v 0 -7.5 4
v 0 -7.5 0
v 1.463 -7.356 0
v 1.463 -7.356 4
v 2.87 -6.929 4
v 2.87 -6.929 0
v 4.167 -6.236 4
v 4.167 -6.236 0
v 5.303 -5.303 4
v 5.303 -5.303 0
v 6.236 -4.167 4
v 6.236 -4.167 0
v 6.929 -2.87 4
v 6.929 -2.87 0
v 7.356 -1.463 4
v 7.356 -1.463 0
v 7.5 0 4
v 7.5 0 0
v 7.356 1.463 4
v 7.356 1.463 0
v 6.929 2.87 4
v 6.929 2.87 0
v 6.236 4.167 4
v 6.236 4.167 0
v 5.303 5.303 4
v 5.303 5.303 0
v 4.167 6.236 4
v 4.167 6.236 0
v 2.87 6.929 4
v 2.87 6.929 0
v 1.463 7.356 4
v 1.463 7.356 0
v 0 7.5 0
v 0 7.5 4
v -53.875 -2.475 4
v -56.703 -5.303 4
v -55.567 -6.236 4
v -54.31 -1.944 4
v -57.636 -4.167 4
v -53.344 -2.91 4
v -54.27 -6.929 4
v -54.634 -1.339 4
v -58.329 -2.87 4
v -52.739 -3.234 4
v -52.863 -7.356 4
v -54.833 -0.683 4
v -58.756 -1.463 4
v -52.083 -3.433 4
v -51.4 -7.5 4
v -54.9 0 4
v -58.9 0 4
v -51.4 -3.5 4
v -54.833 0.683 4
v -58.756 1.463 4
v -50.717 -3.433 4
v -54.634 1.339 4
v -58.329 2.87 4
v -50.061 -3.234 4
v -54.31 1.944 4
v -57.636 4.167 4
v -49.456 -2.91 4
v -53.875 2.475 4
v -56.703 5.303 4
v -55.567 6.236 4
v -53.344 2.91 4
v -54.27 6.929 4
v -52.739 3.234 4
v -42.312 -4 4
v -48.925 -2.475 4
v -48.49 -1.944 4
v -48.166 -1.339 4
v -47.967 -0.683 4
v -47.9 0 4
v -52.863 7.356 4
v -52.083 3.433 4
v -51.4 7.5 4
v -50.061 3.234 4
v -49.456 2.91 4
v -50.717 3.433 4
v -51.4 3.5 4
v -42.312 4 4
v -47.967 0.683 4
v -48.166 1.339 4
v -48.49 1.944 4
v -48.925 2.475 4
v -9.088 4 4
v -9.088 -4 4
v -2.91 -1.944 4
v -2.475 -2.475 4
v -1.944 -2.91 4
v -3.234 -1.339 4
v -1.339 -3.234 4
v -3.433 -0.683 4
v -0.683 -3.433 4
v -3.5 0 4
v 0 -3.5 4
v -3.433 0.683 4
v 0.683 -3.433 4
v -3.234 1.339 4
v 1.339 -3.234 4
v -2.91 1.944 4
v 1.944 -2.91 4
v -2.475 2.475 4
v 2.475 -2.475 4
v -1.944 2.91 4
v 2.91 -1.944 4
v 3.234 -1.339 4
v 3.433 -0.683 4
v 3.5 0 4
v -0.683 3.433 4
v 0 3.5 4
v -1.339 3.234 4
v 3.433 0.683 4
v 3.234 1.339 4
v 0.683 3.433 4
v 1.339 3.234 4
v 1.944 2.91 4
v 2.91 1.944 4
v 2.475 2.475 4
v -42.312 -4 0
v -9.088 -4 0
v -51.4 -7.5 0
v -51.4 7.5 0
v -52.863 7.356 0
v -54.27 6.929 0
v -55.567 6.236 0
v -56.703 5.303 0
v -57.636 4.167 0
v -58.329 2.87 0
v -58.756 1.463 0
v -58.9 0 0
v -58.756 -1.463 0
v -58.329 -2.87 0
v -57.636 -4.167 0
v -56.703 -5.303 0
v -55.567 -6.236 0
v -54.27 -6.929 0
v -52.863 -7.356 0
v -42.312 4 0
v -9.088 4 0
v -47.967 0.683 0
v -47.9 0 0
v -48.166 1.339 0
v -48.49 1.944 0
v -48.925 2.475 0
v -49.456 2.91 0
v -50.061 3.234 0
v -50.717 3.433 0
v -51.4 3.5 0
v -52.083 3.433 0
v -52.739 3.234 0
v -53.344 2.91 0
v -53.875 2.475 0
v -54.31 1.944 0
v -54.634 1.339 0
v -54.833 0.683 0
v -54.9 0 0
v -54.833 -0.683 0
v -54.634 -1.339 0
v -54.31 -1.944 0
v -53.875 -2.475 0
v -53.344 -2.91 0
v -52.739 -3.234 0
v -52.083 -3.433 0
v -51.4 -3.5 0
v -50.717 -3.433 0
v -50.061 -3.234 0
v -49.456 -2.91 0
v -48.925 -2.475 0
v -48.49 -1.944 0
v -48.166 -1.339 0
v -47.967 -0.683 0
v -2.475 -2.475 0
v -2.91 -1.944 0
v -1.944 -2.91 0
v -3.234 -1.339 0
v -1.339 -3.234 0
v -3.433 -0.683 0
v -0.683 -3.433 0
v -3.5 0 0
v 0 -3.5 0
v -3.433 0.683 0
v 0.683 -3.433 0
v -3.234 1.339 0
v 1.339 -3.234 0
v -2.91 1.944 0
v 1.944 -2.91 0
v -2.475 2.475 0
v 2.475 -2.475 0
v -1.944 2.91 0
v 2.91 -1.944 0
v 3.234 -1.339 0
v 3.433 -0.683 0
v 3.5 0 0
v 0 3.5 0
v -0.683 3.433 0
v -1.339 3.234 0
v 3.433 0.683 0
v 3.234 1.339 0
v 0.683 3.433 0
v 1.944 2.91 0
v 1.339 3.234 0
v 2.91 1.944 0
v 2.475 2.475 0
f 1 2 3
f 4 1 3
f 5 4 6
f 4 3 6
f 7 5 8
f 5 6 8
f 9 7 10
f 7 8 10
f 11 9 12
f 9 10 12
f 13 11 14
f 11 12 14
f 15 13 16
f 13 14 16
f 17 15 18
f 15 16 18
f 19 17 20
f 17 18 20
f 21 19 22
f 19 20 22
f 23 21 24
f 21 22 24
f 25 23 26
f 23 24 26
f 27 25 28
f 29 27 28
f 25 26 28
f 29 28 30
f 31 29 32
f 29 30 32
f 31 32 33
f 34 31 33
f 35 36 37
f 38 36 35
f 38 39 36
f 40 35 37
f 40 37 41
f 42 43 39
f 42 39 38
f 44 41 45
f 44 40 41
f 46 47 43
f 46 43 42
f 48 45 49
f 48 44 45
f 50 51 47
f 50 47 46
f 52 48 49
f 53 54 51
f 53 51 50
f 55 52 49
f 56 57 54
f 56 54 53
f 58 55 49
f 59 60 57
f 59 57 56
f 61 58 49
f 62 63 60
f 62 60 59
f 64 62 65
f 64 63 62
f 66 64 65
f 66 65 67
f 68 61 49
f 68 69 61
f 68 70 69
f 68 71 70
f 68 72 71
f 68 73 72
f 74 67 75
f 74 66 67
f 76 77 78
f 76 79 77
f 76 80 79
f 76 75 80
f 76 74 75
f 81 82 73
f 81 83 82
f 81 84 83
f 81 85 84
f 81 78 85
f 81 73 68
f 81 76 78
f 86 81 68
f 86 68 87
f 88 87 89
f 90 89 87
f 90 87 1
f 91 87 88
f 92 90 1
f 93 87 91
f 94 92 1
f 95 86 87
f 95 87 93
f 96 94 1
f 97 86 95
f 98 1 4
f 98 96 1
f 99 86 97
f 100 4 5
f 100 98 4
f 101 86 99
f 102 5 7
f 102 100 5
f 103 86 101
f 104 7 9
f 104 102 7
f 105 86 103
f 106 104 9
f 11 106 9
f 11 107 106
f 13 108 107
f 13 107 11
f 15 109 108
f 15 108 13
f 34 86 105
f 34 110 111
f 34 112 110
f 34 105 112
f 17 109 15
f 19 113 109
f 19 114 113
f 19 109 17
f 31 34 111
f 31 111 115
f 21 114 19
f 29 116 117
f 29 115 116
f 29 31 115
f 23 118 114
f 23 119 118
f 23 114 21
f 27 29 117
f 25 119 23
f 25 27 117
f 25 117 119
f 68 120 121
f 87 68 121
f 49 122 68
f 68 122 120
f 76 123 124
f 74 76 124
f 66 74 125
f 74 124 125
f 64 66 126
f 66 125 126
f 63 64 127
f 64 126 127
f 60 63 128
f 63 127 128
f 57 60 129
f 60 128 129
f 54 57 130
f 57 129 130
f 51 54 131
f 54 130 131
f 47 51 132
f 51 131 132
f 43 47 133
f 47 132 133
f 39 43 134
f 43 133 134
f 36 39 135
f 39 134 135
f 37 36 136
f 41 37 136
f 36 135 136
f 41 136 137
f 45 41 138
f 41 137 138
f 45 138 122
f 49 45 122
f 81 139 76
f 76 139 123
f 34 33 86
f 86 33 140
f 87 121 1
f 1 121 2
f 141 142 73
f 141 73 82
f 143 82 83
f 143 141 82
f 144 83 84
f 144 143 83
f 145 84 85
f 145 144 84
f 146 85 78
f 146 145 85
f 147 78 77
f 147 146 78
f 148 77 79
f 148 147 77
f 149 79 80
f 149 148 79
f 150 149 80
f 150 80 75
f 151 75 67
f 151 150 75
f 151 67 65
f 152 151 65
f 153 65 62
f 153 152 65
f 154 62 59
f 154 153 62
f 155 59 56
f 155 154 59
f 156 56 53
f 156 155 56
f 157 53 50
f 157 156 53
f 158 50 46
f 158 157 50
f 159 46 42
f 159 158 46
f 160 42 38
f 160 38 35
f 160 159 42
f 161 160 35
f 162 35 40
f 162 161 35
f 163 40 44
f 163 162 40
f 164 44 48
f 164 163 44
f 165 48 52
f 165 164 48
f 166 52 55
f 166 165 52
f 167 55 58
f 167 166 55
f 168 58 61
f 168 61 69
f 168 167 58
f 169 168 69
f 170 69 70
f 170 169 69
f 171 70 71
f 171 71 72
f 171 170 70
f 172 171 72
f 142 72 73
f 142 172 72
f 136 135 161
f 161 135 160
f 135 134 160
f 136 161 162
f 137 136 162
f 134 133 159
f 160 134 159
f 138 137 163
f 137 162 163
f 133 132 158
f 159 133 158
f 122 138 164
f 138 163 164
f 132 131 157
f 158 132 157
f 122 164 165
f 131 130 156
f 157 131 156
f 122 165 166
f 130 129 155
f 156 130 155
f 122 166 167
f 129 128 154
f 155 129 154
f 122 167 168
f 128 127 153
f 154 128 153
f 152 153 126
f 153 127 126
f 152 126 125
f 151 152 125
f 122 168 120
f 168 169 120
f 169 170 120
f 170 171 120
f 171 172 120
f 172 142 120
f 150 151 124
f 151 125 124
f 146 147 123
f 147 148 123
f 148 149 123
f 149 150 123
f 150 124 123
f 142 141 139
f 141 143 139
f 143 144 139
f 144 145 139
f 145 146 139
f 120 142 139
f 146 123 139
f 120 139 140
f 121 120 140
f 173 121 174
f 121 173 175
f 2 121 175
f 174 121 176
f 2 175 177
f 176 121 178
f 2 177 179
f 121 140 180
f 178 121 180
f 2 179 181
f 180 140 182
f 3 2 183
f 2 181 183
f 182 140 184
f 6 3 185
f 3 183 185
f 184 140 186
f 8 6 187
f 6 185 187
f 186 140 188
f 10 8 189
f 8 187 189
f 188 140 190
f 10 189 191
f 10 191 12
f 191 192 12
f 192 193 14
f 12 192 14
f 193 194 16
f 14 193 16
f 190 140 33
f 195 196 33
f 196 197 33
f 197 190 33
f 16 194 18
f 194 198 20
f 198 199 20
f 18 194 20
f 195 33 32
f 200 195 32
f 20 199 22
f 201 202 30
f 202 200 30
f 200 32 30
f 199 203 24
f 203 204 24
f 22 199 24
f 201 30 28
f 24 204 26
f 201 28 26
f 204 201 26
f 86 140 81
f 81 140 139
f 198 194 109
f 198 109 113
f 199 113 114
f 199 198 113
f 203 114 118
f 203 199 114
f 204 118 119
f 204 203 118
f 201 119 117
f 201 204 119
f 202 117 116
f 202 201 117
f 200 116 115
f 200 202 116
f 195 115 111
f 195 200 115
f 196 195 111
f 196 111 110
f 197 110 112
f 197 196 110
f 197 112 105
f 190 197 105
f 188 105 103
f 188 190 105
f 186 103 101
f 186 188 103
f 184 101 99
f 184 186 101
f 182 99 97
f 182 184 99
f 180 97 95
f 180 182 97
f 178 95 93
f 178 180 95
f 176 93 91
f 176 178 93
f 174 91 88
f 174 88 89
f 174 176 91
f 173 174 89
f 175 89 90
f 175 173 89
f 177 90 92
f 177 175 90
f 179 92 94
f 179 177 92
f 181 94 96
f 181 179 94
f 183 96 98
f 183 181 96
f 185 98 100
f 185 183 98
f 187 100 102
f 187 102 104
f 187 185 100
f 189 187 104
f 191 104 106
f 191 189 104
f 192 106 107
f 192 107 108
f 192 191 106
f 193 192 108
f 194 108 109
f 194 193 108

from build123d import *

# Parameters (mm, degrees)
SKETCH1_R           = 3.5
BOSS_EXTRUDE2_DEPTH = 4


with BuildPart() as part:
    # Sketch1 → Boss-Extrude2 (new body)
    with BuildSketch(Plane.XY):
        with BuildLine():
            Line((0, 7.5), (-9.088423691, 4))
            Line((-9.088423691, 4), (-42.311576309, 4))
            Line((-42.311576309, 4), (-51.4, 7.5))
            ThreePointArc((-51.4, 7.5), (-58.9, 0), (-51.4, -7.5))
            Line((-51.4, -7.5), (-42.311576309, -4))
            Line((-42.311576309, -4), (-9.088423691, -4))
            Line((-9.088423691, -4), (0, -7.5))
            ThreePointArc((0, -7.5), (7.5, 0), (0, 7.5))
        make_face()
        Circle(SKETCH1_R, mode=Mode.SUBTRACT)
        with Locations((-51.4, 0)):
            Circle(SKETCH1_R, mode=Mode.SUBTRACT)
    extrude(amount=BOSS_EXTRUDE2_DEPTH)


solid = part.part
